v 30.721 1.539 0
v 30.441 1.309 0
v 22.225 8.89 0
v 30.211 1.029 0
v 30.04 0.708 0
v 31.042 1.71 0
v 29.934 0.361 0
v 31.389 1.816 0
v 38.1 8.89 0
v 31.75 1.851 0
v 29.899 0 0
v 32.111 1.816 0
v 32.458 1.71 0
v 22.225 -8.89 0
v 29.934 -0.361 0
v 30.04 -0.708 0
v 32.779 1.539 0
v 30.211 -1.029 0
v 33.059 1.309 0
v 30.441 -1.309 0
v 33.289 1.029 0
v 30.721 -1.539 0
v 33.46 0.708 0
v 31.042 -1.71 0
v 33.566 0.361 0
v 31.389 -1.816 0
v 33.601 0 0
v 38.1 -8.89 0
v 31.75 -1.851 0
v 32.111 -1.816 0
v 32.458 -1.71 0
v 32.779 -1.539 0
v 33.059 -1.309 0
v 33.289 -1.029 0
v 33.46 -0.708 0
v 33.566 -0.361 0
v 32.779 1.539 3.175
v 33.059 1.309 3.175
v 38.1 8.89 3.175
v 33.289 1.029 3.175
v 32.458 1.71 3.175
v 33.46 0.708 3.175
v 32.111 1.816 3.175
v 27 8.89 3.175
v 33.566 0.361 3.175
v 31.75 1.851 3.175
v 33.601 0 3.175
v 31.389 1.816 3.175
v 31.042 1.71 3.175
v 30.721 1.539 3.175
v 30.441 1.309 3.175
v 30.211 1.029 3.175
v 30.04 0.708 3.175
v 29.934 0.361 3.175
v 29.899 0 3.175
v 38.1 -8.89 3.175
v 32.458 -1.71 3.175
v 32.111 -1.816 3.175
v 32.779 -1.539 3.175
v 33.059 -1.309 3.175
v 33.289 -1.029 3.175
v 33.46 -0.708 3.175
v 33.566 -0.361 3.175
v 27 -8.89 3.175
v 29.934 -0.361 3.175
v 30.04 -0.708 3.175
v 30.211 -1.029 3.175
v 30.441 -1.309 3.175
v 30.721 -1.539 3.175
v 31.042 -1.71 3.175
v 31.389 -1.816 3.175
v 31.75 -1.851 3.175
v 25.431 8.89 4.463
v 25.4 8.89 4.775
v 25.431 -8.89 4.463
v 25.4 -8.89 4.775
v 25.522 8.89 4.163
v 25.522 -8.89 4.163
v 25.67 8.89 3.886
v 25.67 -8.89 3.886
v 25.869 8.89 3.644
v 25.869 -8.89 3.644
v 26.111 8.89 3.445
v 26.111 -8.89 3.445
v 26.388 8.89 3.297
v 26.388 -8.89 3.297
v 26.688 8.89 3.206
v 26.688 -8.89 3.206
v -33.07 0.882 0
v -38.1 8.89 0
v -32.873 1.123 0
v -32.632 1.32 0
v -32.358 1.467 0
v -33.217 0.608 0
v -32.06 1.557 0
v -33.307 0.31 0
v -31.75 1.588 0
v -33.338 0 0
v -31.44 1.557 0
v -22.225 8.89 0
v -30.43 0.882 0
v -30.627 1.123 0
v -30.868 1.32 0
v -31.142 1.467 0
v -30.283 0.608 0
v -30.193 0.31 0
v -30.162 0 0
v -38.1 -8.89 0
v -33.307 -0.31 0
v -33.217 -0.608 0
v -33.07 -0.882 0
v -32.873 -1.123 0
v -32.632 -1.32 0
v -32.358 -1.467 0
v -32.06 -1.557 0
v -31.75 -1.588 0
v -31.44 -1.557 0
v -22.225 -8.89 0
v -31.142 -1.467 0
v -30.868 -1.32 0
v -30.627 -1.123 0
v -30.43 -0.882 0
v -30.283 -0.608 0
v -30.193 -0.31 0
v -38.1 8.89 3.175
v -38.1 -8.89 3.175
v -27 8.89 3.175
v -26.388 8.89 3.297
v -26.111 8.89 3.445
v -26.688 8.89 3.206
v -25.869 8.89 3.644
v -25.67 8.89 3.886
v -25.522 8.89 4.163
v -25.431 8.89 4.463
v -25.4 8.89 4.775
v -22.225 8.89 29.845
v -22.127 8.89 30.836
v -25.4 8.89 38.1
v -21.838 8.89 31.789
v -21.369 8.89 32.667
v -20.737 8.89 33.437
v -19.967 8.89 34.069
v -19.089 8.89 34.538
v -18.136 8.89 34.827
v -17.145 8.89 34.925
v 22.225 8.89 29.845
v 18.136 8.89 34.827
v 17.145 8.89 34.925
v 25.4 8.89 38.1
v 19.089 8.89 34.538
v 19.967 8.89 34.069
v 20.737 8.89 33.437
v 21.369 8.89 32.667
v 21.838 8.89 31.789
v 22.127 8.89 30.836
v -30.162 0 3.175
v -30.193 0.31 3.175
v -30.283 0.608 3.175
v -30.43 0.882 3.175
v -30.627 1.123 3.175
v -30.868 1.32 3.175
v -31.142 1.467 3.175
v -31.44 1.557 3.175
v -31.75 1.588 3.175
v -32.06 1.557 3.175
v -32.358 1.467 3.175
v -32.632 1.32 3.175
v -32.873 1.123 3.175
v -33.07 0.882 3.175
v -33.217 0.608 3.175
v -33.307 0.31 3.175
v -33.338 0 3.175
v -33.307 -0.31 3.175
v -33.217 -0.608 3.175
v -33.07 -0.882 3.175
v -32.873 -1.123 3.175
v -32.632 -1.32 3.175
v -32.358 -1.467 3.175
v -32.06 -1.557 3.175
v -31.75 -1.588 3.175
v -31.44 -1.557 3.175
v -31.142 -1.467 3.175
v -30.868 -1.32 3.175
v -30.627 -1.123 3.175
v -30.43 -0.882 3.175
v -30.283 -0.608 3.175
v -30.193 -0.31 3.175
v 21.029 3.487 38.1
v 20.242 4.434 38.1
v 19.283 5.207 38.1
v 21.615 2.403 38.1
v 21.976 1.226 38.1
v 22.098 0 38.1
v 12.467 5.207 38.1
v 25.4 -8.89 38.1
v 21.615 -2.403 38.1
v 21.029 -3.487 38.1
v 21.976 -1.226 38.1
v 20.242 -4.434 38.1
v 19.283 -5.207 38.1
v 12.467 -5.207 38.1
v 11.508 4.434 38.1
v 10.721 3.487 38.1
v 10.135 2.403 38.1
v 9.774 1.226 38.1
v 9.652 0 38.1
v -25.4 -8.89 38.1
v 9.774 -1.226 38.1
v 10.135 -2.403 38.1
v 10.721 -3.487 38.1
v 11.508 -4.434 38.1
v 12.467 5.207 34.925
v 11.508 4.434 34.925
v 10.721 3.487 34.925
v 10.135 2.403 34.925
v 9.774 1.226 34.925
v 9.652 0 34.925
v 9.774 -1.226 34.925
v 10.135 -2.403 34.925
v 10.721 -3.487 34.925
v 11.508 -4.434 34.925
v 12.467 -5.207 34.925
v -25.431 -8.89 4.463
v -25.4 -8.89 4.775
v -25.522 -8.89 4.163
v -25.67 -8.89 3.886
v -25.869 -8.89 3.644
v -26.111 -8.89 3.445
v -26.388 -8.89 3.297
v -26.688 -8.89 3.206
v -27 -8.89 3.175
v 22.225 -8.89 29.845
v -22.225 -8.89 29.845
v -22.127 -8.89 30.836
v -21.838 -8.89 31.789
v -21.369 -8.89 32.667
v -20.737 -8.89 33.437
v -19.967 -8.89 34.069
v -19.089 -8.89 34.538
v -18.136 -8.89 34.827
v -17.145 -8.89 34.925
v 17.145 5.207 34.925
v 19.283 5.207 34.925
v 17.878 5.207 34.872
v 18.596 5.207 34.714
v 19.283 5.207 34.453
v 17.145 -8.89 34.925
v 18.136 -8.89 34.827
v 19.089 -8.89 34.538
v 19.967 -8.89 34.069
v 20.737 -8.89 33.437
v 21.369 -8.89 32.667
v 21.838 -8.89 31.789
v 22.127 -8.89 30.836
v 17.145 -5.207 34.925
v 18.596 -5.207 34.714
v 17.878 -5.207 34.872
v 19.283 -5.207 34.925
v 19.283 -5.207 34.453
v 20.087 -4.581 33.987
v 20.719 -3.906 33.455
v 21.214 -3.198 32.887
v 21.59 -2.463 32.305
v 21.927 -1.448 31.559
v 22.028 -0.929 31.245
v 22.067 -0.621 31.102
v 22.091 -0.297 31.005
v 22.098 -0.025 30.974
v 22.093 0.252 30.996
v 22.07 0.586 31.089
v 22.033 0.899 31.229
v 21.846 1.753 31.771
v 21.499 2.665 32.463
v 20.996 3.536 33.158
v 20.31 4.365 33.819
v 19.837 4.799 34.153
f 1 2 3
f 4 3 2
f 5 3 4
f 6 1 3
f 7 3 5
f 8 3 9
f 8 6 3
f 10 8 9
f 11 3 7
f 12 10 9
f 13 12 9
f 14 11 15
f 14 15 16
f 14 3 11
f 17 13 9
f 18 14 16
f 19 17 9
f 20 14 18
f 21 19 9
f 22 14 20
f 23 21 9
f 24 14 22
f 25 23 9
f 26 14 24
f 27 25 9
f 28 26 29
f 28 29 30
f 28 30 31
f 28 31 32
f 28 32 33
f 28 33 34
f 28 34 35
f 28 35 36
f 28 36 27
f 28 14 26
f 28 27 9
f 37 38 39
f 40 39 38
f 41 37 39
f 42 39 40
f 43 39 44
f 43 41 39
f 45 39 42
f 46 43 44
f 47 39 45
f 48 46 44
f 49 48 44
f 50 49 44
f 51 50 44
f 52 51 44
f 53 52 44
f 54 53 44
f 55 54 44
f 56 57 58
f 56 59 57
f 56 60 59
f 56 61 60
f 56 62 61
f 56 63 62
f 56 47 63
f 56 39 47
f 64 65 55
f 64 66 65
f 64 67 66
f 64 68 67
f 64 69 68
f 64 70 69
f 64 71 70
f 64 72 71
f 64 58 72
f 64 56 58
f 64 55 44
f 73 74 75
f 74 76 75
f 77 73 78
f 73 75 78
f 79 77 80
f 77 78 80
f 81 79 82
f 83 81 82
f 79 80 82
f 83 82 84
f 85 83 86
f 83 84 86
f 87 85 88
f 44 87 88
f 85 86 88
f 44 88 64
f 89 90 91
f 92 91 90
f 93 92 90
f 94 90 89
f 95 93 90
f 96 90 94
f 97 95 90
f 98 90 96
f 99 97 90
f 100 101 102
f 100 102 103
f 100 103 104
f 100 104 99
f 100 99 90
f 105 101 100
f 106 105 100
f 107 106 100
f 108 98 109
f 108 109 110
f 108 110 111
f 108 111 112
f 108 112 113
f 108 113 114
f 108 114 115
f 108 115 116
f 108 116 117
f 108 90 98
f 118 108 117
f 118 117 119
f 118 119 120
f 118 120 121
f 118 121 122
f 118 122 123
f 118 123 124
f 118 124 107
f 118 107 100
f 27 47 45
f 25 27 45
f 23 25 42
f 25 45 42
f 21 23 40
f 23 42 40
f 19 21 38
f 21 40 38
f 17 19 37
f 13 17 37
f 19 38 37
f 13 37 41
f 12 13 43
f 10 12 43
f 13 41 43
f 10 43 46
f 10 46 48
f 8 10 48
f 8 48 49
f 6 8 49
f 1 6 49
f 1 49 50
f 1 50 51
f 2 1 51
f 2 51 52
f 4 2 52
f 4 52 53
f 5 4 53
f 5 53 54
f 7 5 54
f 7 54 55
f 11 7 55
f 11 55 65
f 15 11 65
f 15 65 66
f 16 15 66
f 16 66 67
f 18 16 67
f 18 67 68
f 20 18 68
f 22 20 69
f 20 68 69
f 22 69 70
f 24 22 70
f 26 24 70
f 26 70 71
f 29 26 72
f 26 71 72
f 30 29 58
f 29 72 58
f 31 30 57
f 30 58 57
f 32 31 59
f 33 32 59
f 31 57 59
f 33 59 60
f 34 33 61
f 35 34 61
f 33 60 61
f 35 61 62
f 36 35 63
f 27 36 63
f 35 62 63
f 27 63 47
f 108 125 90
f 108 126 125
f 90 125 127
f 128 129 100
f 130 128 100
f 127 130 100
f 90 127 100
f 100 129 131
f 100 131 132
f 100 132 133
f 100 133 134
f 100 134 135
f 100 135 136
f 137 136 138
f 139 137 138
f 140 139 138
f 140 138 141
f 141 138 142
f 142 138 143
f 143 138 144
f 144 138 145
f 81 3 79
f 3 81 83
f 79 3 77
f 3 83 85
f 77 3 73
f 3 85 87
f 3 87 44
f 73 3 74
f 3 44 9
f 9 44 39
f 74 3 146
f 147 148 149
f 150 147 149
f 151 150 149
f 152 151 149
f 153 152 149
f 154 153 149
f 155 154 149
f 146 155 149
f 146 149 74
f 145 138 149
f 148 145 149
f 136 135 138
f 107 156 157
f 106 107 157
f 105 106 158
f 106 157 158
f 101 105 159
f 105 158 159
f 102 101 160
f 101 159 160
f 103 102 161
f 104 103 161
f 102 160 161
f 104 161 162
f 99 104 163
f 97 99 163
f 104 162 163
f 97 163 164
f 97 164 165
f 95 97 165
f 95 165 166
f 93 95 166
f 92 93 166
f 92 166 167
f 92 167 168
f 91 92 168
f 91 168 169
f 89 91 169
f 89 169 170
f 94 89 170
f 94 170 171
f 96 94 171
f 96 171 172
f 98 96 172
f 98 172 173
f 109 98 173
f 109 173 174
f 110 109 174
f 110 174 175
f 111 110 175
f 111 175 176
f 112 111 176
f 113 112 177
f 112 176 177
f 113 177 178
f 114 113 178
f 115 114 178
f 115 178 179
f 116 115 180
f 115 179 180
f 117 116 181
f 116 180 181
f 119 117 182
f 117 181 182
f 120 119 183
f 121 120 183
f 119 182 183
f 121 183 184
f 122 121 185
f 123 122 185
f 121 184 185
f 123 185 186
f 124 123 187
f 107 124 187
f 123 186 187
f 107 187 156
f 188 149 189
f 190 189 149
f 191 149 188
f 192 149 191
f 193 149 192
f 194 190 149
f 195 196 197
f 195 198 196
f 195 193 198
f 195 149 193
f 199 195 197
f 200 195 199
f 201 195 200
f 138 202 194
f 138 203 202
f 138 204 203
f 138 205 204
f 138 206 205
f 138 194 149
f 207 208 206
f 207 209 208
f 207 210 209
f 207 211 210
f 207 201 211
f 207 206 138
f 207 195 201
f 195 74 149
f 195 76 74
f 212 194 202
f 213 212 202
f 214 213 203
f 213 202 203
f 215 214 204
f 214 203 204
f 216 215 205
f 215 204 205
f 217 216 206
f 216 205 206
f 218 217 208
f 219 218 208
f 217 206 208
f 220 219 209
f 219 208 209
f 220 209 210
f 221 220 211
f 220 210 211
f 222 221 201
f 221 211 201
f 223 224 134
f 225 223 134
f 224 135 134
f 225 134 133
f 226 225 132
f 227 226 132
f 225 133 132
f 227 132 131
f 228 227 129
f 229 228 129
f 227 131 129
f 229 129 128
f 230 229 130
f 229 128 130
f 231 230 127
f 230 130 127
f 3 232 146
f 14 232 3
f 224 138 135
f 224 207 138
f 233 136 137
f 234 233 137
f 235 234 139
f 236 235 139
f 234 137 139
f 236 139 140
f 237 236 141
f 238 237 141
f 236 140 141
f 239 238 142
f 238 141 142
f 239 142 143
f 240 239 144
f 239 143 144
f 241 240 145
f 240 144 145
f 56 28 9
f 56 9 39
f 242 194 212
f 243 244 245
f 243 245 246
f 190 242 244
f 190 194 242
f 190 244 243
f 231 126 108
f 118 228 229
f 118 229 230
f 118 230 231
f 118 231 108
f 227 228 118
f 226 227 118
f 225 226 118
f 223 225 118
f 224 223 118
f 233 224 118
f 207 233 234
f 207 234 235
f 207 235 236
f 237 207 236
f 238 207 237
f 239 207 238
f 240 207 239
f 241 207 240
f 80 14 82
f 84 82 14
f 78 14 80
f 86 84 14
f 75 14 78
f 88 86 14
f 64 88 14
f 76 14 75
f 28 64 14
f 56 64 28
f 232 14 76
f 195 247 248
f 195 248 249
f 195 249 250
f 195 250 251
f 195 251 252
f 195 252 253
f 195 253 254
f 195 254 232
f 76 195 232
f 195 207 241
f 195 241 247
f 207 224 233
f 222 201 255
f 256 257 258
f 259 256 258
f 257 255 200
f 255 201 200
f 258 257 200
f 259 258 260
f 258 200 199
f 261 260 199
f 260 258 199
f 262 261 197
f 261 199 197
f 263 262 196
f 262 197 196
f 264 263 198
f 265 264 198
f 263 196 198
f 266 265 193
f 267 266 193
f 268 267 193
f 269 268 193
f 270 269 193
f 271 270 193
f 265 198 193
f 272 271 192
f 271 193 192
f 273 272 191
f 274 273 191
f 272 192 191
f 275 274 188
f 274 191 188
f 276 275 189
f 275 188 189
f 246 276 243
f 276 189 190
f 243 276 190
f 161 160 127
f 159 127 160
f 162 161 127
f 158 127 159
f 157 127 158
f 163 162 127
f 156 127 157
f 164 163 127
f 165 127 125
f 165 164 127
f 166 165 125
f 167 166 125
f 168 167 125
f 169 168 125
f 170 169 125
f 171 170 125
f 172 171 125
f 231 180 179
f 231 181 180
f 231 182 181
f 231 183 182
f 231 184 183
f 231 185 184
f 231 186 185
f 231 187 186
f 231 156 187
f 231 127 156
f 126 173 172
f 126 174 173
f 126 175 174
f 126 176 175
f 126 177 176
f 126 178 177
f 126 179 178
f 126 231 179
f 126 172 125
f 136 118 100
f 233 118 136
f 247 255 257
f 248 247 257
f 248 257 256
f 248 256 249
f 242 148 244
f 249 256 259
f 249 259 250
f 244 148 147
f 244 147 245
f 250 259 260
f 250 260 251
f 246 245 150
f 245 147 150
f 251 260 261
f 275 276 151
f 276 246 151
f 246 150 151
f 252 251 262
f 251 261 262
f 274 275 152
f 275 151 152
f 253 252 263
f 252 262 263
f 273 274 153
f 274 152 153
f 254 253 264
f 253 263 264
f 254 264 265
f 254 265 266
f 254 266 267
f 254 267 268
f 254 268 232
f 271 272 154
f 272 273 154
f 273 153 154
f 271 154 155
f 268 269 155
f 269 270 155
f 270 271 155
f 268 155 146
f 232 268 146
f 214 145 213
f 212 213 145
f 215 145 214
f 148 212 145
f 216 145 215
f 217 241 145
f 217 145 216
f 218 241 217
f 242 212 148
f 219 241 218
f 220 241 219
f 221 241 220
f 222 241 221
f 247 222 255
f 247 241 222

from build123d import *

# Parameters (mm, degrees)
F1_DEPTH     = 8.89
F2_R         = 1.5875
F2_R_2       = 1.8513271914
F3_DEPTH     = 3.176
F5_DEPTH     = 38.101
F6_T1_DEPTH  = 17.78
F6_T6_DEPTH  = 17.78
F6_S8_R      = 6.223
F6_T9_DEPTH  = 11
F6_T13_DEPTH = 17.78
F6_S16_R     = 6.223
F6_T17_DEPTH = 11
F6_T21_DEPTH = 17.78
F6_S23_R     = 6.223
F6_T24_DEPTH = 11
F6_T28_DEPTH = 17.78
F6_S30_R     = 6.223
F6_T31_DEPTH = 11
F6_T35_DEPTH = 17.78
F6_S37_R     = 6.223
F6_T38_DEPTH = 11
F7_R         = 1.6002


# Not quite as in the source:
# - a fillet or chamfer that OpenCascade refuses, or shapes differently, is made with other operations: its cross-section is extruded or revolved along the edge and cut away or added


with BuildPart() as f1:
    # F0 (on Front) → F1 (new body, symmetric)
    with BuildSketch(Plane.XZ):
        Polygon((-38.1, 3.175), (-38.1, 0), (-22.225, 0), (-22.225, 34.925), (22.225, 34.925), (22.225, 0), (38.1, 0), (38.1, 3.175), (25.4, 3.175), (25.4, 38.1), (-25.4, 38.1), (-25.4, 3.175), align=None)
    extrude(amount=F1_DEPTH, both=True)

    # F2 (on face) → F3 (cut, through all)
    with BuildSketch(Plane.XY.offset(3.175)):
        with Locations((-31.75, 0)):
            Circle(F2_R)
        with Locations((31.75, 0)):
            Circle(F2_R_2)
    extrude(amount=-F3_DEPTH, mode=Mode.SUBTRACT)

    # F4 (on face) → F5 (cut, through all)
    with BuildSketch(Plane.XY.offset(38.1)):
        with BuildLine():
            Line((19.2827675977, 5.207), (12.4672324023, 5.207))
            ThreePointArc((12.4672324023, 5.207), (9.652, 0), (12.4672324023, -5.207))
            Line((12.4672324023, -5.207), (19.2827675977, -5.207))
            ThreePointArc((19.2827675977, -5.207), (22.098, 0), (19.2827675977, 5.207))
        make_face()
    extrude(amount=-F5_DEPTH, mode=Mode.SUBTRACT)

    # F6: fillet of radius 5.08 on 2 edges, made by hand

    # F6_s2 → F6_t1 (join)
    with BuildSketch(Plane.XZ.offset(-8.89)):
        with BuildLine():
            ThreePointArc((-22.225, 29.845), (-20.7371024484, 33.4371024484), (-17.145, 34.925))
            Line((-17.145, 34.925), (-22.225, 34.925))
            Line((-22.225, 34.925), (-22.225, 29.845))
        make_face()
    extrude(amount=F6_T1_DEPTH)


with BuildPart() as f6_tool4:
    # F6_s5 → F6_t6 (new body)
    with BuildSketch(Plane.XZ.offset(-8.89)):
        with BuildLine():
            ThreePointArc((17.145, 34.925), (20.7371024484, 33.4371024484), (22.225, 29.845))
            Line((22.225, 29.845), (22.225, 34.925))
            Line((22.225, 34.925), (17.145, 34.925))
        make_face()
    extrude(amount=F6_T6_DEPTH)

    split(bisect_by=Plane.XZ.offset(-5.207), keep=Keep.BOTTOM)

    # F6_s8 → F6_t9 (cut, symmetric)
    with BuildSketch(Plane.XY.offset(32.4)):
        with Locations((15.875, 0)):
            Circle(F6_S8_R)
    extrude(amount=F6_T9_DEPTH, both=True, mode=Mode.SUBTRACT)


with BuildPart() as f1_1:
    add(f1.part)

    # F6_t3: union F6_tool4
    add(f6_tool4.part)


with BuildPart() as f6_tool11:
    # F6_s12 → F6_t13 (new body)
    with BuildSketch(Plane.XZ.offset(-8.89)):
        with BuildLine():
            ThreePointArc((17.145, 34.925), (20.7371024484, 33.4371024484), (22.225, 29.845))
            Line((22.225, 29.845), (22.225, 34.925))
            Line((22.225, 34.925), (17.145, 34.925))
        make_face()
    extrude(amount=F6_T13_DEPTH)

    split(bisect_by=Plane.XZ.offset(5.207), keep=Keep.BOTTOM)

    split(bisect_by=Plane.XZ.offset(-5.207), keep=Keep.TOP)

    # F6_s16 → F6_t17 (cut, symmetric)
    with BuildSketch(Plane.XY.offset(32.4)):
        with Locations((15.875, 0)):
            Circle(F6_S16_R)
    extrude(amount=F6_T17_DEPTH, both=True, mode=Mode.SUBTRACT)


with BuildPart() as f1_2:
    add(f1_1.part)

    # F6_t10: union F6_tool11
    add(f6_tool11.part)


with BuildPart() as f6_tool19:
    # F6_s20 → F6_t21 (new body)
    with BuildSketch(Plane.XZ.offset(-8.89)):
        with BuildLine():
            ThreePointArc((17.145, 34.925), (20.7371024484, 33.4371024484), (22.225, 29.845))
            Line((22.225, 29.845), (22.225, 34.925))
            Line((22.225, 34.925), (17.145, 34.925))
        make_face()
    extrude(amount=F6_T21_DEPTH)

    split(bisect_by=Plane.XZ.offset(-5.207), keep=Keep.BOTTOM)

    # F6_s23 → F6_t24 (intersect, symmetric)
    with BuildSketch(Plane.XY.offset(32.4)):
        with Locations((15.875, 0)):
            Circle(F6_S23_R)
    extrude(amount=F6_T24_DEPTH, both=True, mode=Mode.INTERSECT)


with BuildPart() as f1_3:
    add(f1_2.part)

    # F6_t18: union F6_tool19
    add(f6_tool19.part)


with BuildPart() as f6_tool26:
    # F6_s27 → F6_t28 (new body)
    with BuildSketch(Plane.XZ.offset(-8.89)):
        with BuildLine():
            ThreePointArc((17.145, 34.925), (20.7371024484, 33.4371024484), (22.225, 29.845))
            Line((22.225, 29.845), (22.225, 34.925))
            Line((22.225, 34.925), (17.145, 34.925))
        make_face()
    extrude(amount=F6_T28_DEPTH)

    split(bisect_by=Plane.XZ.offset(5.207), keep=Keep.TOP)

    # F6_s30 → F6_t31 (cut, symmetric)
    with BuildSketch(Plane.XY.offset(32.4)):
        with Locations((15.875, 0)):
            Circle(F6_S30_R)
    extrude(amount=F6_T31_DEPTH, both=True, mode=Mode.SUBTRACT)


with BuildPart() as f1_4:
    add(f1_3.part)

    # F6_t25: union F6_tool26
    add(f6_tool26.part)


with BuildPart() as f6_tool33:
    # F6_s34 → F6_t35 (new body)
    with BuildSketch(Plane.XZ.offset(-8.89)):
        with BuildLine():
            ThreePointArc((17.145, 34.925), (20.7371024484, 33.4371024484), (22.225, 29.845))
            Line((22.225, 29.845), (22.225, 34.925))
            Line((22.225, 34.925), (17.145, 34.925))
        make_face()
    extrude(amount=F6_T35_DEPTH)

    split(bisect_by=Plane.XZ.offset(5.207), keep=Keep.TOP)

    # F6_s37 → F6_t38 (intersect, symmetric)
    with BuildSketch(Plane.XY.offset(32.4)):
        with Locations((15.875, 0)):
            Circle(F6_S37_R)
    extrude(amount=F6_T38_DEPTH, both=True, mode=Mode.INTERSECT)


with BuildPart() as f1_5:
    add(f1_4.part)

    # F6_t32: union F6_tool33
    add(f6_tool33.part)

    # F7
    f7_edges = [f1_5.edges().sort_by_distance(p)[0] for p in [
        (-25.4, 0, 3.175),
        (25.4, 0, 3.175),
    ]]
    fillet(f7_edges, radius=F7_R)


solid = f1_5.part
